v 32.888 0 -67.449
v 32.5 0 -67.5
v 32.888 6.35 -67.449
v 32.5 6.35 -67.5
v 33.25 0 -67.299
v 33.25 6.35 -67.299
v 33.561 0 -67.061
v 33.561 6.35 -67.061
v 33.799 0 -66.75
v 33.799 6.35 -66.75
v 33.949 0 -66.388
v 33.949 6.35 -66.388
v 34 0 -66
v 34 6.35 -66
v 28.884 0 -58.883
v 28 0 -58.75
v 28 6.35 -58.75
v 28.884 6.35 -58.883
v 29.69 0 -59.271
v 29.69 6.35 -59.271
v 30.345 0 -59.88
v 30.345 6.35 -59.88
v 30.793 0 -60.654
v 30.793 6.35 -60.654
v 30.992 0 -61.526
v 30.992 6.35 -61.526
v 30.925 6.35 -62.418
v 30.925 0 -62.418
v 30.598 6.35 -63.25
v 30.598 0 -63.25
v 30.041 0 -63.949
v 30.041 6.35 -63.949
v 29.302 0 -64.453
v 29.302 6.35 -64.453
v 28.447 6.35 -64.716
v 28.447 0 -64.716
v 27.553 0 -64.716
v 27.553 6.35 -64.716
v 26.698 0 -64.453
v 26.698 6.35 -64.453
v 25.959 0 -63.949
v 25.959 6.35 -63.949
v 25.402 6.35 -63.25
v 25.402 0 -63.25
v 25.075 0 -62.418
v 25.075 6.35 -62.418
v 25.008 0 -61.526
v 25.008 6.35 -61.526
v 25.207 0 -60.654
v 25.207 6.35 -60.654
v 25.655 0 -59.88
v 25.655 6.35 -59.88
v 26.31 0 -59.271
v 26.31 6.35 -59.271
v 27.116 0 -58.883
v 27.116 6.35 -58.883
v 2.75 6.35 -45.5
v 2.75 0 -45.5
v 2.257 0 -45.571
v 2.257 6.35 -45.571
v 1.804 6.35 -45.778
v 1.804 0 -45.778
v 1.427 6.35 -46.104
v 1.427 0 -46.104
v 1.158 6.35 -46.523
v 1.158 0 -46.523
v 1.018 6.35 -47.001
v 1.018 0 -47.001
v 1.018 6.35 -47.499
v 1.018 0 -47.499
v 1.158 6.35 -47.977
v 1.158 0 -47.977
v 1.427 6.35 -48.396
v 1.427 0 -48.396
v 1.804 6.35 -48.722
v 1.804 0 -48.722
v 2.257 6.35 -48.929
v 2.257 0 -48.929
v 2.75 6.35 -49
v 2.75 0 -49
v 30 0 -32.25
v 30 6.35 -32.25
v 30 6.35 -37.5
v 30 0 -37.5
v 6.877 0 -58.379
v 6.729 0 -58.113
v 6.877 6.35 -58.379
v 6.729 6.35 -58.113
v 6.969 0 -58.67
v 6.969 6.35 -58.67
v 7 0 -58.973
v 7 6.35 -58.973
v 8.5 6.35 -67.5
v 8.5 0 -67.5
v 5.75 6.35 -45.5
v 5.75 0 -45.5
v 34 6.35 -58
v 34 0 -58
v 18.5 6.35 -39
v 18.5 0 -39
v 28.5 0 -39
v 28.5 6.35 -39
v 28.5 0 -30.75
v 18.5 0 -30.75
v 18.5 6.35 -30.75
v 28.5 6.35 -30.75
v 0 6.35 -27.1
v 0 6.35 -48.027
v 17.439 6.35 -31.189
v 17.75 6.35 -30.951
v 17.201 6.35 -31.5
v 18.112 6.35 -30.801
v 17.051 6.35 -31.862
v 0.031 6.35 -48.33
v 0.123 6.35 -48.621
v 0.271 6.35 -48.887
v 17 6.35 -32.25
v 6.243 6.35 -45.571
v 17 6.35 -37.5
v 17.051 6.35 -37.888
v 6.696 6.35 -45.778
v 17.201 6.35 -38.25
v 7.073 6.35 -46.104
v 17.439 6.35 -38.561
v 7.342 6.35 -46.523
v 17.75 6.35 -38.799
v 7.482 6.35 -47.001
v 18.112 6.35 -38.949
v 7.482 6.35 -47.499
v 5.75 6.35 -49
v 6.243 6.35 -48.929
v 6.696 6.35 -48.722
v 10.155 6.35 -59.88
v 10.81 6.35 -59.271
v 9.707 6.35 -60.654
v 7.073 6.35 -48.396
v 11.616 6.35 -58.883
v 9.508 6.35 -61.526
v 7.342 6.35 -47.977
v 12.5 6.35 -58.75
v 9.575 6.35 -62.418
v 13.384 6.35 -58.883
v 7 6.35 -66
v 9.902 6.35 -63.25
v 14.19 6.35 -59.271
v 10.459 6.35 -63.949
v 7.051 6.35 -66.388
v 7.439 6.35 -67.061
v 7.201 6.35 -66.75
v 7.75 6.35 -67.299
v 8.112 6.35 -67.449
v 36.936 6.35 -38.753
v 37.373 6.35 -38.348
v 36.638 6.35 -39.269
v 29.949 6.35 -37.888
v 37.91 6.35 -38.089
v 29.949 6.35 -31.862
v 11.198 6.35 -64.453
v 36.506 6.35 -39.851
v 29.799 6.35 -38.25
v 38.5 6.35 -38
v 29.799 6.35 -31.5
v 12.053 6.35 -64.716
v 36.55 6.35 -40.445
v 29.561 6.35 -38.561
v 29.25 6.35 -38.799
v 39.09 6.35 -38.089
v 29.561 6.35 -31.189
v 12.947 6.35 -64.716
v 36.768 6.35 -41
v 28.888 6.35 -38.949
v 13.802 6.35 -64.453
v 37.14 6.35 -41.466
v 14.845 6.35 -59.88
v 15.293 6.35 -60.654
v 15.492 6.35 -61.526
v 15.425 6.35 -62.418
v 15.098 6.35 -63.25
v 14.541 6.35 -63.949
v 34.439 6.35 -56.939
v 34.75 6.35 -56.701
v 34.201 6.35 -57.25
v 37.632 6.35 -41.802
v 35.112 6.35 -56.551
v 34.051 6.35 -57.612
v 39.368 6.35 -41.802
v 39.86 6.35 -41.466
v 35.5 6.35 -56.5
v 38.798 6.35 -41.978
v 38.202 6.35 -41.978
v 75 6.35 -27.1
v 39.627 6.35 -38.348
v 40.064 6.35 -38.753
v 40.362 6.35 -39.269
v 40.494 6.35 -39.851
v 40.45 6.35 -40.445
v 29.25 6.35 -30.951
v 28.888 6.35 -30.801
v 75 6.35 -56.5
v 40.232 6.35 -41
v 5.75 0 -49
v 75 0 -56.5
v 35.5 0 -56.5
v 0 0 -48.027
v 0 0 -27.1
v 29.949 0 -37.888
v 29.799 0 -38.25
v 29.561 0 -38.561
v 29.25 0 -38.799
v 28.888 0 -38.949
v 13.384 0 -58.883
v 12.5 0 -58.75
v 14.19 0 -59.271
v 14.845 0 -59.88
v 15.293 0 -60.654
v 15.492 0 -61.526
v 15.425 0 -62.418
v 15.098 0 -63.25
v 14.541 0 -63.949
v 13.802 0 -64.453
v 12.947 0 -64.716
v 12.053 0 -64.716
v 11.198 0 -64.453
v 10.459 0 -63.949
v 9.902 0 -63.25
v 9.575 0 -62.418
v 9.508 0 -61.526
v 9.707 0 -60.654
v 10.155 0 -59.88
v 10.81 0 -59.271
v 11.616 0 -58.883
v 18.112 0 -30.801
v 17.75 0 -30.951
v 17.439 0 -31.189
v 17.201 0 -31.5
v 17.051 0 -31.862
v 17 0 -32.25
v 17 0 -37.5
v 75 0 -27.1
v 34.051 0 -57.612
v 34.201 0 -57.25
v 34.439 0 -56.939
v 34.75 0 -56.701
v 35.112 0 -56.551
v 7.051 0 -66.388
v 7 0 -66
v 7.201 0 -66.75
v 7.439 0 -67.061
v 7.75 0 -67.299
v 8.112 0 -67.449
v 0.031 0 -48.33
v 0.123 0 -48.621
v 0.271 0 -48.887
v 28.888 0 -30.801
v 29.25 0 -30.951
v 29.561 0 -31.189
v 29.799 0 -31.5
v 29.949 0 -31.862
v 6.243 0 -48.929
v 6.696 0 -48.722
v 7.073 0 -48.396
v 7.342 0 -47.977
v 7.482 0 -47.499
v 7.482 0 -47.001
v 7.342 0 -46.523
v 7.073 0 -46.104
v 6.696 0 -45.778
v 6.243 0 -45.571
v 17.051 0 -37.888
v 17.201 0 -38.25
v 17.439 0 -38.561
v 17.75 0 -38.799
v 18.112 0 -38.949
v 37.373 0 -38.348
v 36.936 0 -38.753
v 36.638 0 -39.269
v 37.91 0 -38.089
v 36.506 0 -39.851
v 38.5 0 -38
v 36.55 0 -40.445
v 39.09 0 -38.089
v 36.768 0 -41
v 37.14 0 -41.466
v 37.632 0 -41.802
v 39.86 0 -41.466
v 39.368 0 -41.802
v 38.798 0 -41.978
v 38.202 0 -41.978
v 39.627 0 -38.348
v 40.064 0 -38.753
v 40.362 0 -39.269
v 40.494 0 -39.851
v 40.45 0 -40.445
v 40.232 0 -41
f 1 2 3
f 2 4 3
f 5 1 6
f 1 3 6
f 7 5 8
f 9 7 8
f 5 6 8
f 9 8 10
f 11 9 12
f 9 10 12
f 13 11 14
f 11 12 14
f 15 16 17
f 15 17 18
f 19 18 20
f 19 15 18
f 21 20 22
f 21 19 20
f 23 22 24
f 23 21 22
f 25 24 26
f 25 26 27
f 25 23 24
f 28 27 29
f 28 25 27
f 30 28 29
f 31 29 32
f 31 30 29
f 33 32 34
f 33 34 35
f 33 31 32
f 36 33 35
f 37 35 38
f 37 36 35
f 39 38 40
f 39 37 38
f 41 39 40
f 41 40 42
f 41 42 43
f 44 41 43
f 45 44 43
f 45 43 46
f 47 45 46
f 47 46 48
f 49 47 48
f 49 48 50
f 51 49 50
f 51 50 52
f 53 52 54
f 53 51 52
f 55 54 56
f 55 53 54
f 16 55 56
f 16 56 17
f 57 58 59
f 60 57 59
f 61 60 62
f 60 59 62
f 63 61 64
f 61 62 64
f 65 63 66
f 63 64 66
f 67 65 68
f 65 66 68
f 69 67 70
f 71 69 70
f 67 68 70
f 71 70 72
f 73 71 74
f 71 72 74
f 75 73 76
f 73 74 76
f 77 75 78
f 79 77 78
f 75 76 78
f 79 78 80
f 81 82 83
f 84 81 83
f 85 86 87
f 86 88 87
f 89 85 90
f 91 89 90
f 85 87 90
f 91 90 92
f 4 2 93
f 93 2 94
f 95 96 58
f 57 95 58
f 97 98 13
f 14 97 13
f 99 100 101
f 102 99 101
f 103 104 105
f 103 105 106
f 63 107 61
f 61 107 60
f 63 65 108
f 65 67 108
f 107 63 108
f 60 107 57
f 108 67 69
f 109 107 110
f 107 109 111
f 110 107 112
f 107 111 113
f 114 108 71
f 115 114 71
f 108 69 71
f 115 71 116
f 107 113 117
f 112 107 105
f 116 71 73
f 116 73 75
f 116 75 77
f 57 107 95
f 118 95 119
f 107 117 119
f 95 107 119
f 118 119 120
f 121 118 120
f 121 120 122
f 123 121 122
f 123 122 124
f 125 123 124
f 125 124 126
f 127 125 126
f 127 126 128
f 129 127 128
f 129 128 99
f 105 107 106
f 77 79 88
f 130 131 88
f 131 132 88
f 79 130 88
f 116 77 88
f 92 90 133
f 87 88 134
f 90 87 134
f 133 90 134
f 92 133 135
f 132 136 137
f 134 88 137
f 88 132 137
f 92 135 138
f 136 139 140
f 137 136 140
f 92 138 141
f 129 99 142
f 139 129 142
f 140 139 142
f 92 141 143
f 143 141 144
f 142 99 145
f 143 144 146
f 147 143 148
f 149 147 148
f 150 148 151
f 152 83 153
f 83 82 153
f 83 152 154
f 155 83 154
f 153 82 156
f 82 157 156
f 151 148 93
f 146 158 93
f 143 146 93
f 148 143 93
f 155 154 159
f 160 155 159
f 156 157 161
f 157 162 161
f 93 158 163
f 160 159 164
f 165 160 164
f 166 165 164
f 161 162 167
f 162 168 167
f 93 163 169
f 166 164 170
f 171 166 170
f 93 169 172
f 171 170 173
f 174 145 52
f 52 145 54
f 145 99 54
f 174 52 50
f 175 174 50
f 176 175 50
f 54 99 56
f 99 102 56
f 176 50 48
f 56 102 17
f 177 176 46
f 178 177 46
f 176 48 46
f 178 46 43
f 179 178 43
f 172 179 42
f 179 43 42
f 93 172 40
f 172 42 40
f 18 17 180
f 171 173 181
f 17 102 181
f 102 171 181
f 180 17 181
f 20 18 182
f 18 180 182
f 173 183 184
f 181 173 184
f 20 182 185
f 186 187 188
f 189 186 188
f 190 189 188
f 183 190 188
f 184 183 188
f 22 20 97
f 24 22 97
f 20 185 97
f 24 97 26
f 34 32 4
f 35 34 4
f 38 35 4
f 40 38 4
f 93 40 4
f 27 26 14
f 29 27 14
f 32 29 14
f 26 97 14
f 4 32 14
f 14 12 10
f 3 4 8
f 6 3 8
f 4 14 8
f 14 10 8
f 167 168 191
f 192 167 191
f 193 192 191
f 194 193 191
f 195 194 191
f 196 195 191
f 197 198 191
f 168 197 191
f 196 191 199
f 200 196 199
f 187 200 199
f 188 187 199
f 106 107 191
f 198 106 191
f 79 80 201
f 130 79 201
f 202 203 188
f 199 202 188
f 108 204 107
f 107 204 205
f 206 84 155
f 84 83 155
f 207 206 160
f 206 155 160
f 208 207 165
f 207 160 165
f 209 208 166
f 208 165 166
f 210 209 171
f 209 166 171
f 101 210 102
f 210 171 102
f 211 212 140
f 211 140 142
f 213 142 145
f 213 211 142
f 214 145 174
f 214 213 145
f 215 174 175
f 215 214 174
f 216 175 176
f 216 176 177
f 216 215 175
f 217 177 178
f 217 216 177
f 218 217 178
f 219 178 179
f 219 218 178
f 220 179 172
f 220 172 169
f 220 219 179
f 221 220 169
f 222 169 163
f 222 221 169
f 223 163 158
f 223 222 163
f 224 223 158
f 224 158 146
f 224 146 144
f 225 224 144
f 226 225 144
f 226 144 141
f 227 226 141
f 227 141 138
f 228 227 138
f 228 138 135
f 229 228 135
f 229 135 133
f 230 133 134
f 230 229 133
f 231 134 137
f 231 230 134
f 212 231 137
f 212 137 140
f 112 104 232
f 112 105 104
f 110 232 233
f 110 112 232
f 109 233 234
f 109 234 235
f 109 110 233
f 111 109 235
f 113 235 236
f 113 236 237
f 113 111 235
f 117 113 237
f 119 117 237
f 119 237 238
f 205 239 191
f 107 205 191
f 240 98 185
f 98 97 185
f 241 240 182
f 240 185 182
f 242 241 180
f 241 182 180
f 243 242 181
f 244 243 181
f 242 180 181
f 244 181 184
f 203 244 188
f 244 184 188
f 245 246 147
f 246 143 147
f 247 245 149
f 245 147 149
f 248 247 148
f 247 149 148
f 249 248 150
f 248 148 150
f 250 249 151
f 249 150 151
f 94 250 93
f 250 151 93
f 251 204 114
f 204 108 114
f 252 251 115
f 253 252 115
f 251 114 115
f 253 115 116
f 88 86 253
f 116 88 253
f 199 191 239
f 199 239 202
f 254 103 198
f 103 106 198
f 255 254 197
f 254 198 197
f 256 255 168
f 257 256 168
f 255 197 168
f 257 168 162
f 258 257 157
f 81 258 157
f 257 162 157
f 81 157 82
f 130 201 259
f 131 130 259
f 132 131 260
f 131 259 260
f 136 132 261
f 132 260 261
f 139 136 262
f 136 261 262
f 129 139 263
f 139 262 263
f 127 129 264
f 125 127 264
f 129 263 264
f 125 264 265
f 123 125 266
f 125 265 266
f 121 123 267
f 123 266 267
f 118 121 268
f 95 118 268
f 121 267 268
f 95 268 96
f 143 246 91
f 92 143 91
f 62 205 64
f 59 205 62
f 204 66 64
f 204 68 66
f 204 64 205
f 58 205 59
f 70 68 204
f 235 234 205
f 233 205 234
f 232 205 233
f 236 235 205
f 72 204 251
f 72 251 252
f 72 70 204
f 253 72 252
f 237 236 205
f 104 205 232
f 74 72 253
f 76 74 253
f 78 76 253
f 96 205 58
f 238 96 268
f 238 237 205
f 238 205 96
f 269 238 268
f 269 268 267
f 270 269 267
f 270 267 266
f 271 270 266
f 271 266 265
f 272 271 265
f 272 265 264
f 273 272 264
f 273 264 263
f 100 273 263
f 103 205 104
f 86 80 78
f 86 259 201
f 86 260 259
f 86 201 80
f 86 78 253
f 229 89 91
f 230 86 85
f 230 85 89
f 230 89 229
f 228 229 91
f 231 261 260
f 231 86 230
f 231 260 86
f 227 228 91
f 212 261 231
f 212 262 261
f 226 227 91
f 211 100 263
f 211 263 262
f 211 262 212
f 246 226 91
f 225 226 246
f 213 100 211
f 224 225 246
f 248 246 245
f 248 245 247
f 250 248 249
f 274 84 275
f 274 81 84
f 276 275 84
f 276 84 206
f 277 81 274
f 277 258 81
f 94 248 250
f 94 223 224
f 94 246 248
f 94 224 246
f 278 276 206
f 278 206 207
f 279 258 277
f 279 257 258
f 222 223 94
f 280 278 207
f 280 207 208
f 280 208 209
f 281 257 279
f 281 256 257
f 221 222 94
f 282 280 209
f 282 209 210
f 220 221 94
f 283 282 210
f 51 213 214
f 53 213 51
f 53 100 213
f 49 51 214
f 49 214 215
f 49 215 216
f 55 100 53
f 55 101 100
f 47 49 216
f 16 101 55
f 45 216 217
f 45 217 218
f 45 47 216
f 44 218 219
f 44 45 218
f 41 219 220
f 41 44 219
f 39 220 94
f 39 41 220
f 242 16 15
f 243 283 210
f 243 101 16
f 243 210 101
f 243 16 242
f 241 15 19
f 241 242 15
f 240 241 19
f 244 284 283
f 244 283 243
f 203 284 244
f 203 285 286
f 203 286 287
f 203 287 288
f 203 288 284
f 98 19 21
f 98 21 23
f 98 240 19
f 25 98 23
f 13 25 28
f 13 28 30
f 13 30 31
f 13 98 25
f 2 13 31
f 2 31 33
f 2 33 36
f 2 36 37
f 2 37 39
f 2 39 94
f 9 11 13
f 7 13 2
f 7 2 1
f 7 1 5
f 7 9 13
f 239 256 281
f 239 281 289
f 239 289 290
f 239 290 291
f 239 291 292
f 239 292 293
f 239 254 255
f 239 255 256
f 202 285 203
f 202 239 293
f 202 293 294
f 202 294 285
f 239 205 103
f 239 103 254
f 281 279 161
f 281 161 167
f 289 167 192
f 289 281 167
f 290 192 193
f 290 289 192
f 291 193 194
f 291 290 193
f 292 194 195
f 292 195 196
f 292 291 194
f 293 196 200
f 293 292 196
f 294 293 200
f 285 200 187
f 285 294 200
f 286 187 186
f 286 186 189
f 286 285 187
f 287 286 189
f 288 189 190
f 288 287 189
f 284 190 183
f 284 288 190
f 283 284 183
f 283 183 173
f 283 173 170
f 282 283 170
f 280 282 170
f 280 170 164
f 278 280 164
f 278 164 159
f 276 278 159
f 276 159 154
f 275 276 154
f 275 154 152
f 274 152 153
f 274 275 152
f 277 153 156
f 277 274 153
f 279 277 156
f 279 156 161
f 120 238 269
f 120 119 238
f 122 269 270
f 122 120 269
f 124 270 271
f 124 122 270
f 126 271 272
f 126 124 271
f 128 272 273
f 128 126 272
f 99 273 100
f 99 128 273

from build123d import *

# Parameters (mm, degrees)
SKETCH1_R           = 2
SKETCH1_R_2         = 3
SKETCH1_W           = 13
SKETCH1_H           = 8.25
BOSS_EXTRUDE1_DEPTH = 6.35
FILLET1_R           = 1.5
SKETCH2_W           = 82.327825706
SKETCH2_H           = 14.458254131
CUT_EXTRUDE1_DEPTH  = 51
SKETCH3_W           = 51.5
SKETCH3_H           = 6.35
BOSS_EXTRUDE2_DEPTH = 25
SKETCH4_W           = 84.929028447
SKETCH4_H           = 25.885902506
CUT_EXTRUDE2_DEPTH  = 90
SKETCH5_W           = 0.1
SKETCH5_H           = 6.35
CUT_EXTRUDE3_DEPTH  = 90
SKETCH6_W           = 81.24526446
SKETCH6_H           = 21.013173112
CUT_EXTRUDE4_DEPTH  = 90


with BuildPart() as part:
    # Sketch1 → Boss-Extrude1 (new body)
    with BuildSketch(Plane(origin=(0, 0, 0), x_dir=(1, 0, 0), z_dir=(0, 1, 0))):
        Polygon((38, 0), (38, 5), (58, 5), (58, 0), (96, 0), (96, 48.5), (89, 58.5), (89, 67.5), (62, 67.5), (62, 56.5), (34, 56.5), (34, 67.5), (7, 67.5), (7, 58.5), (0, 48.5), (0, 0), align=None)
        with Locations(Location((38.5, 40, 0), (0, 0, 270))):
            Circle(SKETCH1_R, mode=Mode.SUBTRACT)
        with Locations(Location((38.5, 22, 0), (0, 0, 270))):
            Circle(SKETCH1_R, mode=Mode.SUBTRACT)
        with Locations(Location((57.5, 22, 0), (0, 0, 90))):
            Circle(SKETCH1_R, mode=Mode.SUBTRACT)
        with Locations(Location((57.5, 40, 0), (0, 0, 90))):
            Circle(SKETCH1_R, mode=Mode.SUBTRACT)
        with Locations(Location((12.5, 61.75, 0), (0, 0, 270))):
            Circle(SKETCH1_R_2, mode=Mode.SUBTRACT)
        with Locations(Location((28, 61.75, 0), (0, 0, 270))):
            Circle(SKETCH1_R_2, mode=Mode.SUBTRACT)
        with Locations(Location((68, 61.75, 0), (0, 0, 90))):
            Circle(SKETCH1_R_2, mode=Mode.SUBTRACT)
        with Locations(Location((83.5, 61.75, 0), (0, 0, 90))):
            Circle(SKETCH1_R_2, mode=Mode.SUBTRACT)
        with Locations((72.5, 18.625)):
            Rectangle(SKETCH1_W, SKETCH1_H, mode=Mode.SUBTRACT)
        with Locations((23.5, 34.875)):
            Rectangle(SKETCH1_W, SKETCH1_H, mode=Mode.SUBTRACT)
        with Locations((23.5, 18.625)):
            Rectangle(SKETCH1_W, SKETCH1_H, mode=Mode.SUBTRACT)
        with Locations((72.5, 34.875)):
            Rectangle(SKETCH1_W, SKETCH1_H, mode=Mode.SUBTRACT)
        with BuildLine():
            Line((2.75, 11.75), (5.75, 11.75))
            ThreePointArc((5.75, 11.75), (7.5, 10), (5.75, 8.25))
            Line((5.75, 8.25), (2.75, 8.25))
            ThreePointArc((2.75, 8.25), (1, 10), (2.75, 11.75))
        make_face(mode=Mode.SUBTRACT)
        with BuildLine():
            Line((93.25, 8.25), (90.25, 8.25))
            ThreePointArc((90.25, 8.25), (88.5, 10), (90.25, 11.75))
            Line((90.25, 11.75), (93.25, 11.75))
            ThreePointArc((93.25, 11.75), (95, 10), (93.25, 8.25))
        make_face(mode=Mode.SUBTRACT)
        with BuildLine():
            Line((93.25, 45.5), (90.25, 45.5))
            ThreePointArc((90.25, 45.5), (88.5, 47.25), (90.25, 49))
            Line((90.25, 49), (93.25, 49))
            ThreePointArc((93.25, 49), (95, 47.25), (93.25, 45.5))
        make_face(mode=Mode.SUBTRACT)
        with BuildLine():
            Line((2.75, 49), (5.75, 49))
            ThreePointArc((5.75, 49), (7.5, 47.25), (5.75, 45.5))
            Line((5.75, 45.5), (2.75, 45.5))
            ThreePointArc((2.75, 45.5), (1, 47.25), (2.75, 49))
        make_face(mode=Mode.SUBTRACT)
    extrude(amount=BOSS_EXTRUDE1_DEPTH)

    # Fillet1
    fillet1_edges = [part.edges().sort_by_distance(p)[0] for p in [
        (0, 3.175, -48.5),
        (7, 3.175, -58.5),
        (7, 3.175, -67.5),
        (34, 3.175, -67.5),
        (34, 3.175, -56.5),
        (62, 3.175, -56.5),
        (62, 3.175, -67.5),
        (89, 3.175, -67.5),
        (89, 3.175, -58.5),
        (96, 3.175, -48.5),
        (96, 3.175, 0),
        (58, 3.175, 0),
        (58, 3.175, -5),
        (38, 3.175, -5),
        (38, 3.175, 0),
        (0, 3.175, 0),
        (17, 3.175, -39),
        (17, 3.175, -30.75),
        (30, 3.175, -30.75),
        (30, 3.175, -39),
        (17, 3.175, -22.75),
        (17, 3.175, -14.5),
        (30, 3.175, -14.5),
        (30, 3.175, -22.75),
        (79, 3.175, -14.5),
        (79, 3.175, -22.75),
        (66, 3.175, -22.75),
        (66, 3.175, -14.5),
        (79, 3.175, -30.75),
        (79, 3.175, -39),
        (66, 3.175, -39),
        (66, 3.175, -30.75),
    ]]
    fillet(fillet1_edges, radius=FILLET1_R)

    # Sketch2 → Cut-Extrude1 (cut)
    with BuildSketch(Plane(origin=(48, 0, 0), x_dir=(0, 0, -1), z_dir=(1, 0, 0))):
        with Locations((33.293792952, 1.315835649)):
            Rectangle(SKETCH2_W, SKETCH2_H)
    extrude(amount=CUT_EXTRUDE1_DEPTH, mode=Mode.SUBTRACT)

    # Sketch3 → Boss-Extrude2 (add)
    with BuildSketch(Plane(origin=(48, 0, 0), x_dir=(0, 0, -1), z_dir=(1, 0, 0))):
        with Locations((30.75, 3.175)):
            Rectangle(SKETCH3_W, SKETCH3_H)
    extrude(amount=BOSS_EXTRUDE2_DEPTH)

    # Mirror1: part across plane


with BuildPart() as part_1:
    add(part.part)
    add(part.part.mirror(Plane(origin=(73, 0, 0), x_dir=(0, 0, 1), z_dir=(1, 0, 0))))

    # Sketch4 → Cut-Extrude2 (cut)
    with BuildSketch(Plane(origin=(75, 0, 0), x_dir=(0, 0, -1), z_dir=(1, 0, 0))):
        with Locations((34.029781947, 1.13903014)):
            Rectangle(SKETCH4_W, SKETCH4_H)
    extrude(amount=CUT_EXTRUDE2_DEPTH, mode=Mode.SUBTRACT)

    # Sketch5 → Cut-Extrude3 (cut)
    with BuildSketch(Plane(origin=(75, 0, 0), x_dir=(0, 0, -1), z_dir=(1, 0, 0))):
        with Locations((27.05, 3.175)):
            Rectangle(SKETCH5_W, SKETCH5_H)
    extrude(amount=-CUT_EXTRUDE3_DEPTH, mode=Mode.SUBTRACT)


with BuildPart() as cut_extrude3_piece_1:
    # of the separate pieces the step leaves, piece 1, a body of its own (cut_extrude3_pieces)
    add(part_1.part.solids().sort_by_distance((0, 0, -48.027166654))[0])


with BuildPart() as cut_extrude3_piece_2:
    # of the separate pieces the step leaves, piece 2, a body of its own (cut_extrude3_pieces)
    add(part_1.part.solids().sort_by_distance((38, 0, -1.5))[0])

    # Sketch6 → Cut-Extrude4 (cut)
    with BuildSketch(Plane(origin=(0, 0, -27), x_dir=(-1, 0, 0), z_dir=(0, 0, -1))):
        with Locations((-35.926138856, 1.728749219)):
            Rectangle(SKETCH6_W, SKETCH6_H)
    extrude(amount=-CUT_EXTRUDE4_DEPTH, mode=Mode.SUBTRACT)


solid = cut_extrude3_piece_1.part
